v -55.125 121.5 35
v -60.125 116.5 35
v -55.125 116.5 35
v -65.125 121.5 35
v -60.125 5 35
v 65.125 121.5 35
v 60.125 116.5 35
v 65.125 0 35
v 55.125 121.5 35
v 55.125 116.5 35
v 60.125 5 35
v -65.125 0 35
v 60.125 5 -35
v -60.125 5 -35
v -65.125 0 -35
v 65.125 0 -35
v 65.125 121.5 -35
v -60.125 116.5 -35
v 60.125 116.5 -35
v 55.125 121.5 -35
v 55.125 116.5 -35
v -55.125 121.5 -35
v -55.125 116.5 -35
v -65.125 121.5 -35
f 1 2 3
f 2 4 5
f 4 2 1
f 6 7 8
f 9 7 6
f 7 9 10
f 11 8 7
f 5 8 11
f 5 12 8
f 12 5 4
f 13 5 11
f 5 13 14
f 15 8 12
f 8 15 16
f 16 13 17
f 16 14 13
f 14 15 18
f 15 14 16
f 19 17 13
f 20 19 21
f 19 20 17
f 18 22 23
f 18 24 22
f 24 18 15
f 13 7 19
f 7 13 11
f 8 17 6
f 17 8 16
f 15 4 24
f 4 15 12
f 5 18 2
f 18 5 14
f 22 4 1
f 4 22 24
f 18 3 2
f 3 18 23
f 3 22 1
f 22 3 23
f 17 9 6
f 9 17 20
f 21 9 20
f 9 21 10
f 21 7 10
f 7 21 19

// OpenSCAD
/*
    this is a bottom that connects (anchors) the
    spooler holder to the Control Box. this connector
    hooks around the control box so it is not dislodge
    easily from the Control Box.
*/

Thickness = 5.0;
Width = 150.0;
ControlBoxWidth = 125.25;
ControlBoxHeight = 119; //118.5 is actual.
SpoolWidth = 70.0; //66.5 is actual.
// Height = 

Build();

module Build(args) 
{
    Base();
}

function TranslateBoxWidth(args = 0) = ControlBoxWidth/2 - (args == 1 ? Thickness/2 : 0);
function TranslateBoxHeight(args = 0) = args != 2 ? (ControlBoxHeight/2 + (args == 1 ? Thickness/2 : 0)) : ControlBoxHeight;

module Base()
{
    translate([0, Thickness/2, 0]) 
    rotate([90 , 0, 0]) 
    color("Yellow") linear_extrude(height=Thickness, center=true, convexity=10, twist=0) 
    square(size=[ControlBoxWidth, SpoolWidth], center=true);

    color("Aqua") translate([TranslateBoxWidth(false), TranslateBoxHeight(false), 0]) 
    rotate([90 , 0, 90]) 
    linear_extrude(height=Thickness, center=true, convexity=10, twist=0) 
    square(size=[ControlBoxHeight, SpoolWidth], center=true);

    color("Blue") translate([-TranslateBoxWidth(false), TranslateBoxHeight(false), 0]) 
    rotate([90 , 0, 90]) 
    linear_extrude(height=Thickness, center=true, convexity=10, twist=0) 
    square(size=[ControlBoxHeight, SpoolWidth], center=true);

    color("Gold") translate([-TranslateBoxWidth(1), TranslateBoxHeight(2), 0]) 
    rotate([90 , 0, 0]) 
    linear_extrude(height=Thickness, center=true, convexity=10, twist=0) 
    square(size=[10, SpoolWidth], center=true);

    color("Gold") translate([TranslateBoxWidth(1), TranslateBoxHeight(2), 0]) 
    rotate([90 , 0, 0]) 
    linear_extrude(height=Thickness, center=true, convexity=10, twist=0) 
    square(size=[10, SpoolWidth], center=true);

}
